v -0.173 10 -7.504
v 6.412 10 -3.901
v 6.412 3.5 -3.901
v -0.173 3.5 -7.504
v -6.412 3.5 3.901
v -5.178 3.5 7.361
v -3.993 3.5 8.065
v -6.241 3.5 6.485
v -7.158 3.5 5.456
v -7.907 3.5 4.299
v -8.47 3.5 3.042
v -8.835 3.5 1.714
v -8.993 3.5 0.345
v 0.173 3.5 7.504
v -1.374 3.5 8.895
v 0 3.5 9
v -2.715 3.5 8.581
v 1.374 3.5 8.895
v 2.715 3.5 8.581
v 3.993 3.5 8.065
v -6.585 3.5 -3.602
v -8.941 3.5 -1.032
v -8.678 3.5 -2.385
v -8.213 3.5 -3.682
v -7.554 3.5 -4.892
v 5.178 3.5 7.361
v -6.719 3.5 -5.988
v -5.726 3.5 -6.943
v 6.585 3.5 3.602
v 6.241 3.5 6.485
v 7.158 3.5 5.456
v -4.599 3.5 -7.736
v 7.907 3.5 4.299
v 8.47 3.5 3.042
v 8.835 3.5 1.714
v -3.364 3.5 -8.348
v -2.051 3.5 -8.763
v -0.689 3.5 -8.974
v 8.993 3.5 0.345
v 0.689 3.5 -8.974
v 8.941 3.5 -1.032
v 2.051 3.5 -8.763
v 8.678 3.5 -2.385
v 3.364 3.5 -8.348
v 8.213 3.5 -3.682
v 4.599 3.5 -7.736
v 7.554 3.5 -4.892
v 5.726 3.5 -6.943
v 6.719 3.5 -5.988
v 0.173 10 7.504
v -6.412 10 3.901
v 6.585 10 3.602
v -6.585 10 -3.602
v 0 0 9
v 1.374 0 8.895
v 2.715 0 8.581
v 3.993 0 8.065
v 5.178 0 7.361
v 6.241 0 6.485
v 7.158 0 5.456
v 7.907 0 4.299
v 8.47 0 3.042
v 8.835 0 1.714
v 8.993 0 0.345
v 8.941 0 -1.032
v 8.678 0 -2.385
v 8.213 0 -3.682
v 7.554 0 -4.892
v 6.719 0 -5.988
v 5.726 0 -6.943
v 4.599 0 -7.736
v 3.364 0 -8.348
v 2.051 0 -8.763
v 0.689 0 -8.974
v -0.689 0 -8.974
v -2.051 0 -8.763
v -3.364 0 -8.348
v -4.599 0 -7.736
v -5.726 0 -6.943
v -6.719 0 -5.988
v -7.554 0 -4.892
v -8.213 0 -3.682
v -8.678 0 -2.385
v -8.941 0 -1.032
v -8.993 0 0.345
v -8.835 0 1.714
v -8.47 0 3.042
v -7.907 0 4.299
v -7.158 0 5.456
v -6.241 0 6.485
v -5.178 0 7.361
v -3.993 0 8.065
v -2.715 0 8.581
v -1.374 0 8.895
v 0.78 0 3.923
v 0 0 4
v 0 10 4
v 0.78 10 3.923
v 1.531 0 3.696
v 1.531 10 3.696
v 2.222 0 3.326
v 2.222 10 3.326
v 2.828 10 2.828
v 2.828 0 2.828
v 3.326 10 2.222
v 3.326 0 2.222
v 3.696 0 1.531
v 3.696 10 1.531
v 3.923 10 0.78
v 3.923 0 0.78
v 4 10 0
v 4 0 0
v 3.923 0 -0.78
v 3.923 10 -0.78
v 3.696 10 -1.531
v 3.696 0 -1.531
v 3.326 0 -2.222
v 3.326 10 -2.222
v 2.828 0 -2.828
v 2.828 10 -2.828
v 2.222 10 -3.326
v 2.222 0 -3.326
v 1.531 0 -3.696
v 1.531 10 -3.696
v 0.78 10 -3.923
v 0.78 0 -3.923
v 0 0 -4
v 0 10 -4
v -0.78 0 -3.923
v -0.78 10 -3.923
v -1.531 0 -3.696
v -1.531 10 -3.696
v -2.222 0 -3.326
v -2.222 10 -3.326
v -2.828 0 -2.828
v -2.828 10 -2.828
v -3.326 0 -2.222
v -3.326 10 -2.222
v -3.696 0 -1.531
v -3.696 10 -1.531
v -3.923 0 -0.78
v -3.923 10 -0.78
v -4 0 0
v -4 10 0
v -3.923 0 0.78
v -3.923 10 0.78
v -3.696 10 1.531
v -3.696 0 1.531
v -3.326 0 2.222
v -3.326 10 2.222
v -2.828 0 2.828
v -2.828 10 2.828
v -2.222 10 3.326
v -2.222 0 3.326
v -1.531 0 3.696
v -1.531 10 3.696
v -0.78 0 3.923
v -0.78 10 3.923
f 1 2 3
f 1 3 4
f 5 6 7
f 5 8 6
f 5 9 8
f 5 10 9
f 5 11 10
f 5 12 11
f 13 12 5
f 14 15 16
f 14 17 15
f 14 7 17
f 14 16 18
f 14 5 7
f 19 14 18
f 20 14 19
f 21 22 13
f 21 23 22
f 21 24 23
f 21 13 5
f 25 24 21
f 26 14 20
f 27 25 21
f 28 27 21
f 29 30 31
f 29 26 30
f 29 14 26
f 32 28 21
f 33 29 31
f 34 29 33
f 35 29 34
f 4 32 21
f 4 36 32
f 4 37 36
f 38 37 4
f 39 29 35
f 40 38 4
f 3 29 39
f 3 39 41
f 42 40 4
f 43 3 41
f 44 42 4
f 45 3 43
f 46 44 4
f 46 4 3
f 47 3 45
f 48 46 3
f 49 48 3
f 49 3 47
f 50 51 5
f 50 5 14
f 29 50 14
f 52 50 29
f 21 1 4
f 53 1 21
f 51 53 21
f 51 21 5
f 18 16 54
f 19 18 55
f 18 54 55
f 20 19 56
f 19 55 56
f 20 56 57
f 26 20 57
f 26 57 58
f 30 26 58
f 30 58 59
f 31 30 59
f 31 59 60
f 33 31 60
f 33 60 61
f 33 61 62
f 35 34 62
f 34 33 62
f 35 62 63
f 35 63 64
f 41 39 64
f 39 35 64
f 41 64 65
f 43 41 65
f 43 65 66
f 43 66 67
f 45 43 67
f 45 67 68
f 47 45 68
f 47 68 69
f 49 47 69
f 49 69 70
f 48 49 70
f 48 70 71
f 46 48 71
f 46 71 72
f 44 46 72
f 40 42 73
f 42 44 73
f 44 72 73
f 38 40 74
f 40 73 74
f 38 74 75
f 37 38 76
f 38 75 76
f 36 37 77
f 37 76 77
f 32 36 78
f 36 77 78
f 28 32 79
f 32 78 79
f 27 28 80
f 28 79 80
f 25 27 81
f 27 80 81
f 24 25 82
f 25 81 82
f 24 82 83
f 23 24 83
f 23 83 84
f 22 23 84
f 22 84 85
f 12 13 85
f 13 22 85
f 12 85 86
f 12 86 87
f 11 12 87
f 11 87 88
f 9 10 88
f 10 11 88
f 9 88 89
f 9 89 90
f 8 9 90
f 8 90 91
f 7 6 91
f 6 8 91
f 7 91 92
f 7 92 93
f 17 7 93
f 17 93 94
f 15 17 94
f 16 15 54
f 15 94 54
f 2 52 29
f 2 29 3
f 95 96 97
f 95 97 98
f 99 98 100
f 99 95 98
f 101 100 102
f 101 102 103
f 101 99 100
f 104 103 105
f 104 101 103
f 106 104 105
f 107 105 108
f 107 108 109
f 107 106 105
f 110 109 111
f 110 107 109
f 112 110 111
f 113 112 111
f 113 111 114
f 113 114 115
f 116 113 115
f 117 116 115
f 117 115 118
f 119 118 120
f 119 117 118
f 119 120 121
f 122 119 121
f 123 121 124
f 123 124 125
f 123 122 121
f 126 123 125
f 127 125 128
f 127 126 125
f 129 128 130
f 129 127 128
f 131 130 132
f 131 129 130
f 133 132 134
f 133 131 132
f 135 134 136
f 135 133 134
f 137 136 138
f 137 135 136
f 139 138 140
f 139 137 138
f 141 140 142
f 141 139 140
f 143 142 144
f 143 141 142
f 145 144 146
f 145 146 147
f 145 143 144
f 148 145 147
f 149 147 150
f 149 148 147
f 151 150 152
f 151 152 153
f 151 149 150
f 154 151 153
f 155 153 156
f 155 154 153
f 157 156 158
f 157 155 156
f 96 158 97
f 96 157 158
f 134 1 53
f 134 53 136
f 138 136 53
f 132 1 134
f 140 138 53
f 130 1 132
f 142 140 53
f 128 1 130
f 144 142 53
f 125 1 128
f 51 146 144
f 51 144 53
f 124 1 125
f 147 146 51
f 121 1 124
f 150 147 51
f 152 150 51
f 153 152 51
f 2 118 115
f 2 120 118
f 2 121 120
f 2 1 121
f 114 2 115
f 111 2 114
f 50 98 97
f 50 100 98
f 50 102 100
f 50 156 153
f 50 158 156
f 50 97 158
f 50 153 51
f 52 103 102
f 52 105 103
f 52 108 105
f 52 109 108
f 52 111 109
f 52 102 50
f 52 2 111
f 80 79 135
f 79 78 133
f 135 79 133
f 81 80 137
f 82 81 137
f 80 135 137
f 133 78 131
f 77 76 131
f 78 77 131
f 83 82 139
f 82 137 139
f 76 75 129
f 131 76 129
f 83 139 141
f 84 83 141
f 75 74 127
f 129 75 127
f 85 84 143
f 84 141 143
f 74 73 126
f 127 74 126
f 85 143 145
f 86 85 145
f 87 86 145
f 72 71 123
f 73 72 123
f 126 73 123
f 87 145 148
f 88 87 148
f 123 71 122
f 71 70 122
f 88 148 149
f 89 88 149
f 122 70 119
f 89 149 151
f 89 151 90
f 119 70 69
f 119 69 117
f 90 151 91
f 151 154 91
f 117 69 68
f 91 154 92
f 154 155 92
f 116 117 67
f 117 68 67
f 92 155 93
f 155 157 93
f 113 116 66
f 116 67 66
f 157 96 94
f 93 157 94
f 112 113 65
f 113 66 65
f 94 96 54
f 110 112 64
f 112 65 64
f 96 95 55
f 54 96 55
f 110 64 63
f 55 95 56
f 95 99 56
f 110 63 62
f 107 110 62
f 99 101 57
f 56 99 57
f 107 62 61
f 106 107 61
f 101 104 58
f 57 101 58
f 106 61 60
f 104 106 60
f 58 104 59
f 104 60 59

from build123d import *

# Parameters (mm, degrees)
SKETCH_1_R          = 9
SKETCH_1_R_2        = 4
EXTRUDE_1_DEPTH     = 10
SKETCH_2_R          = 9.49914793
CUT_EXTRUDE_2_DEPTH = 6.5


with BuildPart() as part:
    # 草图1 → 拉伸1 (new body)
    with BuildSketch(Plane(origin=(0, 0, 0), x_dir=(1, 0, 0), z_dir=(0, 1, 0))):
        with Locations(Location((0, 0, 0), (0, 0, 270))):
            Circle(SKETCH_1_R)
        with Locations(Location((0, 0, 0), (0, 0, 270))):
            Circle(SKETCH_1_R_2, mode=Mode.SUBTRACT)
    extrude(amount=EXTRUDE_1_DEPTH)

    # 草图2 → 拉伸2 (cut)
    with BuildSketch(Plane(origin=(0, 10, 0), x_dir=(1, 0, 0), z_dir=(0, 1, 0))):
        Circle(SKETCH_2_R)
        Polygon((6.584703233, -3.602085044), (6.411848771, 3.901477754), (-0.172854462, 7.503562798), (-6.584703233, 3.602085044), (-6.411848771, -3.901477754), (0.172854462, -7.503562798), align=None, mode=Mode.SUBTRACT)
    extrude(amount=-CUT_EXTRUDE_2_DEPTH, mode=Mode.SUBTRACT)


solid = part.part
